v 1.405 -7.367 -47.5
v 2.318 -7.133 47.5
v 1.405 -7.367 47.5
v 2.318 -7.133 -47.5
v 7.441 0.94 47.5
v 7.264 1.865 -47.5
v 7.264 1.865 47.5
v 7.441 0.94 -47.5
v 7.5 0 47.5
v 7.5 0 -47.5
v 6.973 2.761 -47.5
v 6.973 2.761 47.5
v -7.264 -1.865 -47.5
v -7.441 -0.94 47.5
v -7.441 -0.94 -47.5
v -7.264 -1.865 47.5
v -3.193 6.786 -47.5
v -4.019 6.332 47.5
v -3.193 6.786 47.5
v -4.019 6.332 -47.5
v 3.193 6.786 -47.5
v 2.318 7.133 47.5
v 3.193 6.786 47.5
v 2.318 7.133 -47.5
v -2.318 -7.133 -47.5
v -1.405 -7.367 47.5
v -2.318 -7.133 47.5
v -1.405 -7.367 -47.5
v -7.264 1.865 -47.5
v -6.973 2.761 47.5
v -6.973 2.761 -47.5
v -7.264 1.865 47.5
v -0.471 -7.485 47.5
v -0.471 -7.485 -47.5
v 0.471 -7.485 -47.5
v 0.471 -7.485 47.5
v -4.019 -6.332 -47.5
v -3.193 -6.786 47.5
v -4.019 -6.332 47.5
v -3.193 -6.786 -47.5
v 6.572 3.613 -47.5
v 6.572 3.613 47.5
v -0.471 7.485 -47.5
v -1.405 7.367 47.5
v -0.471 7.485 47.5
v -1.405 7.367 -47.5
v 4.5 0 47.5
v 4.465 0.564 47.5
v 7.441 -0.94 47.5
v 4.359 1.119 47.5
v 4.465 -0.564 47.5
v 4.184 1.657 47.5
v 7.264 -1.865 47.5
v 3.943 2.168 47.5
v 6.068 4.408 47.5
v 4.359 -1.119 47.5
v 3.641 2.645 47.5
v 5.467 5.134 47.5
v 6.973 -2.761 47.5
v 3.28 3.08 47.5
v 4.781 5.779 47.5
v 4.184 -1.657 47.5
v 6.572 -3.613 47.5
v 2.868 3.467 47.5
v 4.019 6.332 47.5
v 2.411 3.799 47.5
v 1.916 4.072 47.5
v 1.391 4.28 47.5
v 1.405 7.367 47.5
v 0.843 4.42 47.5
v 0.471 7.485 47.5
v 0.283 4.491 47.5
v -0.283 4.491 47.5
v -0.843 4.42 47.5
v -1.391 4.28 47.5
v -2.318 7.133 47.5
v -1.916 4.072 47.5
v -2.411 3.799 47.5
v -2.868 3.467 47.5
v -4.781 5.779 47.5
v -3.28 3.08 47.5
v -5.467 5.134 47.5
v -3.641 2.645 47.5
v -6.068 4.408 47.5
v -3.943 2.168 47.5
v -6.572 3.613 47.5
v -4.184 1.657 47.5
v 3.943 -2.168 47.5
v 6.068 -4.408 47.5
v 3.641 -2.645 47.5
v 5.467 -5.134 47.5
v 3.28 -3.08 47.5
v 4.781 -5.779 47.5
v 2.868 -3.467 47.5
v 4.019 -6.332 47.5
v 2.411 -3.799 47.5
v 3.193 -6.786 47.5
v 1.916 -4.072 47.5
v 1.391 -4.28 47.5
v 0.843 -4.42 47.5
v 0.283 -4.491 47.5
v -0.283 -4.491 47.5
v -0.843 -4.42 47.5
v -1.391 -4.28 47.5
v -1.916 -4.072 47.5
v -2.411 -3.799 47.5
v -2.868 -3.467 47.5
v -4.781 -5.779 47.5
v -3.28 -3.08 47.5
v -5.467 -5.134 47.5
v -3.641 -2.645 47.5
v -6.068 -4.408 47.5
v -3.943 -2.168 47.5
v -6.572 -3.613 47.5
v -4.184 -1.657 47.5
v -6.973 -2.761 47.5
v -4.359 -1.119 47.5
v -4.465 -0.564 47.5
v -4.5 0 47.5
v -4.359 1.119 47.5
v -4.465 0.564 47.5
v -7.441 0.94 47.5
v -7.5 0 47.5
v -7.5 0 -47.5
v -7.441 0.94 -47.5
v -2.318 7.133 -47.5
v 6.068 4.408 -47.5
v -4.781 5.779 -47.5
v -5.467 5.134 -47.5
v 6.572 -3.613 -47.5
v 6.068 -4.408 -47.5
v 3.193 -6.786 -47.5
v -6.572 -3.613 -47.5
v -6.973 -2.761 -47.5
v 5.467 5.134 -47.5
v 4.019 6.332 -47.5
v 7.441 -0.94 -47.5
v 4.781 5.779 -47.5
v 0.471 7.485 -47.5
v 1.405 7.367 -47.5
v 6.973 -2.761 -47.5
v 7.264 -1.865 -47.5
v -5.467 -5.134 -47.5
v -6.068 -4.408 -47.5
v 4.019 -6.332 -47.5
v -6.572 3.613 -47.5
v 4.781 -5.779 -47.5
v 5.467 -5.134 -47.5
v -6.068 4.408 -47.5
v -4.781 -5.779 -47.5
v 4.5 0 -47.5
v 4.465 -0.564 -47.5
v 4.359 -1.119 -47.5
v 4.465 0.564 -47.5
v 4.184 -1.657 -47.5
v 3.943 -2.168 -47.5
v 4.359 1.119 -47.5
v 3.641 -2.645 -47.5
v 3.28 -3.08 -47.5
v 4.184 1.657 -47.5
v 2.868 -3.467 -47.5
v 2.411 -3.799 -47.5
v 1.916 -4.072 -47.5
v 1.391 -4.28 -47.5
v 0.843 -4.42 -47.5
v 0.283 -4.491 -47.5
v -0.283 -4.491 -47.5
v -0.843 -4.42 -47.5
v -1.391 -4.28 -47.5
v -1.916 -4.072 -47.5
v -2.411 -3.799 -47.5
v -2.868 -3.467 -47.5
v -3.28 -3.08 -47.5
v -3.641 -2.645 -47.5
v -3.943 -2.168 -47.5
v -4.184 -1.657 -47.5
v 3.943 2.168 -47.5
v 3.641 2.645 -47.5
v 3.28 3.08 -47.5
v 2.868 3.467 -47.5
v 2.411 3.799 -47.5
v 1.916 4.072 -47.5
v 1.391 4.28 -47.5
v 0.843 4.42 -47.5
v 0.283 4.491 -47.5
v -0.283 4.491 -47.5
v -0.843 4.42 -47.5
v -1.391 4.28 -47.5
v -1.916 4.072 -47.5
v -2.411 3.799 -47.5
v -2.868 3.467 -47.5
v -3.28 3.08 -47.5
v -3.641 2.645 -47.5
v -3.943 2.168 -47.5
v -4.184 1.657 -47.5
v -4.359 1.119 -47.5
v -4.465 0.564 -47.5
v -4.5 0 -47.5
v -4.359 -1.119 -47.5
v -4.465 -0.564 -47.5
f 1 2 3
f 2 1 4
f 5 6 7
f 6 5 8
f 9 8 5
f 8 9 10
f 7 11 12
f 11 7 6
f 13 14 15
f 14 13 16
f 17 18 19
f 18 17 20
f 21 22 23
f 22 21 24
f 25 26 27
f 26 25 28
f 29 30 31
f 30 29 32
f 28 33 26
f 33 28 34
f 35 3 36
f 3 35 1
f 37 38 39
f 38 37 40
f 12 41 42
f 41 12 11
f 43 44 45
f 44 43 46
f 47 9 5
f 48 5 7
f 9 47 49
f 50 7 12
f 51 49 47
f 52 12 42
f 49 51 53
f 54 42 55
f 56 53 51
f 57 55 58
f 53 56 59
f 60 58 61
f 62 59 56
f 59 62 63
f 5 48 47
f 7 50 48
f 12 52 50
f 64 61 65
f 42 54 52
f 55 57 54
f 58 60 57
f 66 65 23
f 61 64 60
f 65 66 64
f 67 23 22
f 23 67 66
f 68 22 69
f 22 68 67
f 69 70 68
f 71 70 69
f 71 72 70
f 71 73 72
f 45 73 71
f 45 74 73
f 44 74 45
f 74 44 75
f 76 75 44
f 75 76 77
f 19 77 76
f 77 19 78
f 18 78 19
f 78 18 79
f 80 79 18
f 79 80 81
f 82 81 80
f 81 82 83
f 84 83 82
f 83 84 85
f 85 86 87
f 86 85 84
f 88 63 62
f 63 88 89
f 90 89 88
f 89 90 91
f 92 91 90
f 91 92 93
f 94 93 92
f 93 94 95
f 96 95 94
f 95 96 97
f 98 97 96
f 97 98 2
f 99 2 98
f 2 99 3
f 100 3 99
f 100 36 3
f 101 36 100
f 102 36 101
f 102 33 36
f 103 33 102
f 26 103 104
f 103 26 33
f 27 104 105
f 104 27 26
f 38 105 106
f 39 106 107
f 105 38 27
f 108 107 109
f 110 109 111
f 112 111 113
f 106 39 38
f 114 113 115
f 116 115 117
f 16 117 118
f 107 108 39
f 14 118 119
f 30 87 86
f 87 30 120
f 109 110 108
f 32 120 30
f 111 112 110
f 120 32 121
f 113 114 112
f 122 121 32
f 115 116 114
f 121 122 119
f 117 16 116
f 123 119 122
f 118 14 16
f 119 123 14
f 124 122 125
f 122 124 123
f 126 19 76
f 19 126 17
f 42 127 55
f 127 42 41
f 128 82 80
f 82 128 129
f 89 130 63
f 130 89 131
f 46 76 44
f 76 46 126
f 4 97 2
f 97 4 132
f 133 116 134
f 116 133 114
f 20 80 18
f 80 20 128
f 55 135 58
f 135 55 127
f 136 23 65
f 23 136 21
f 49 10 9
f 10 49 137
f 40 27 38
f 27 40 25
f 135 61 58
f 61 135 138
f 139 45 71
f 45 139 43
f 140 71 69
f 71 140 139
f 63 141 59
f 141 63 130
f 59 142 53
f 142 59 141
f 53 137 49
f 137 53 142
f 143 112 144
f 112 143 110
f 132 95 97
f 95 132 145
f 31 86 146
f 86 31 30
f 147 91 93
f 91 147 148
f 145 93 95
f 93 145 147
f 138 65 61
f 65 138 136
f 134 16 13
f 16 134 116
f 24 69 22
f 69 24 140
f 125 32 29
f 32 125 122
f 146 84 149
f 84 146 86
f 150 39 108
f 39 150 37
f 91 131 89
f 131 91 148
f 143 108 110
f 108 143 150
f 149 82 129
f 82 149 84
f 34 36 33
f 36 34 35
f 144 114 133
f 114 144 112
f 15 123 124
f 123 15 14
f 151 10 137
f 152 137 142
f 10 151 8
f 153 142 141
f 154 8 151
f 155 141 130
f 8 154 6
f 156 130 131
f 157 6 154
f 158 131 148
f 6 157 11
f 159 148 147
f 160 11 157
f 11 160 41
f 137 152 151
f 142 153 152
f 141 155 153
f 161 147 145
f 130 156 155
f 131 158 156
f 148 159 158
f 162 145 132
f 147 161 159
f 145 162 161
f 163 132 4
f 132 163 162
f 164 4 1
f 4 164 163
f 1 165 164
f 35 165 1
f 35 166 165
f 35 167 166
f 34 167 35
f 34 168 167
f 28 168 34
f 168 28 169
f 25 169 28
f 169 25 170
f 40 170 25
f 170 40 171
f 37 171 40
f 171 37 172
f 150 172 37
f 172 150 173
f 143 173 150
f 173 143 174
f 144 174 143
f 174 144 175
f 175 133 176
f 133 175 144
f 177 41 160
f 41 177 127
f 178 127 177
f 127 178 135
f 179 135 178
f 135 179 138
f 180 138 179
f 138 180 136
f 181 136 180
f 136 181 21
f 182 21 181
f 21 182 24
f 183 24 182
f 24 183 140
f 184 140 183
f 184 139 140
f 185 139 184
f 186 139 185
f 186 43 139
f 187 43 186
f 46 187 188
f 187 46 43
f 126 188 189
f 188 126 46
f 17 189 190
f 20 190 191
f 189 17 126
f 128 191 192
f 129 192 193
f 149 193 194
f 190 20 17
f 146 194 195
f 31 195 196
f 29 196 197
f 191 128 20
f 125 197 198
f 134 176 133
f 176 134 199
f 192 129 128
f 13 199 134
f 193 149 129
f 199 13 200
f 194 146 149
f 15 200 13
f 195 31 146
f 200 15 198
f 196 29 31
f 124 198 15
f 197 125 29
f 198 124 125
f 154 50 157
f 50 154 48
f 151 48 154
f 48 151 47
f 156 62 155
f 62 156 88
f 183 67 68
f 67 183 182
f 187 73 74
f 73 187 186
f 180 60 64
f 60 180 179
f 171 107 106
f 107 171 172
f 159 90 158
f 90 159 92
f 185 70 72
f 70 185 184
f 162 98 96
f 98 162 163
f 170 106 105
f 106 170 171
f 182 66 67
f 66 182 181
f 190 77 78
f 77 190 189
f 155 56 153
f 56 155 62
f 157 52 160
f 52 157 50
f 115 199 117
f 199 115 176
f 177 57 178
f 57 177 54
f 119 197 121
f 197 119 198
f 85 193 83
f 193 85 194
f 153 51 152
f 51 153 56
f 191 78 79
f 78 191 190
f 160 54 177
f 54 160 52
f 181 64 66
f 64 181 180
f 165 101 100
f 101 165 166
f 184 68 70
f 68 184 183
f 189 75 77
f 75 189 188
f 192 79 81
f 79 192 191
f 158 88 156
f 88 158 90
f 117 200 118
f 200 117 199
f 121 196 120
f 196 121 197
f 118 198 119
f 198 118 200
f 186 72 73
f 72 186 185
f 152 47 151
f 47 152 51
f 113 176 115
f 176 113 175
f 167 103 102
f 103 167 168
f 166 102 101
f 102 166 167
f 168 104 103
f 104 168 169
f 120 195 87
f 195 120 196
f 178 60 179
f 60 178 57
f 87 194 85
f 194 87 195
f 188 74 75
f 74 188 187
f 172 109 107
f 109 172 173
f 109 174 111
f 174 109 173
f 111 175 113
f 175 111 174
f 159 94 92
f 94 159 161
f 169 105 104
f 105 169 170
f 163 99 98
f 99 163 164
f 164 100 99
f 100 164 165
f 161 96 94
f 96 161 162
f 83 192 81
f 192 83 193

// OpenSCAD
$fn = 50;


difference() {
	union() {
		translate(v = [0, 0, -47.5000000000]) {
			cylinder(h = 95, r = 7.5000000000);
		}
	}
	union() {
		translate(v = [0, 0, -100.0000000000]) {
			cylinder(h = 200, r = 4.5000000000);
		}
	}
}
